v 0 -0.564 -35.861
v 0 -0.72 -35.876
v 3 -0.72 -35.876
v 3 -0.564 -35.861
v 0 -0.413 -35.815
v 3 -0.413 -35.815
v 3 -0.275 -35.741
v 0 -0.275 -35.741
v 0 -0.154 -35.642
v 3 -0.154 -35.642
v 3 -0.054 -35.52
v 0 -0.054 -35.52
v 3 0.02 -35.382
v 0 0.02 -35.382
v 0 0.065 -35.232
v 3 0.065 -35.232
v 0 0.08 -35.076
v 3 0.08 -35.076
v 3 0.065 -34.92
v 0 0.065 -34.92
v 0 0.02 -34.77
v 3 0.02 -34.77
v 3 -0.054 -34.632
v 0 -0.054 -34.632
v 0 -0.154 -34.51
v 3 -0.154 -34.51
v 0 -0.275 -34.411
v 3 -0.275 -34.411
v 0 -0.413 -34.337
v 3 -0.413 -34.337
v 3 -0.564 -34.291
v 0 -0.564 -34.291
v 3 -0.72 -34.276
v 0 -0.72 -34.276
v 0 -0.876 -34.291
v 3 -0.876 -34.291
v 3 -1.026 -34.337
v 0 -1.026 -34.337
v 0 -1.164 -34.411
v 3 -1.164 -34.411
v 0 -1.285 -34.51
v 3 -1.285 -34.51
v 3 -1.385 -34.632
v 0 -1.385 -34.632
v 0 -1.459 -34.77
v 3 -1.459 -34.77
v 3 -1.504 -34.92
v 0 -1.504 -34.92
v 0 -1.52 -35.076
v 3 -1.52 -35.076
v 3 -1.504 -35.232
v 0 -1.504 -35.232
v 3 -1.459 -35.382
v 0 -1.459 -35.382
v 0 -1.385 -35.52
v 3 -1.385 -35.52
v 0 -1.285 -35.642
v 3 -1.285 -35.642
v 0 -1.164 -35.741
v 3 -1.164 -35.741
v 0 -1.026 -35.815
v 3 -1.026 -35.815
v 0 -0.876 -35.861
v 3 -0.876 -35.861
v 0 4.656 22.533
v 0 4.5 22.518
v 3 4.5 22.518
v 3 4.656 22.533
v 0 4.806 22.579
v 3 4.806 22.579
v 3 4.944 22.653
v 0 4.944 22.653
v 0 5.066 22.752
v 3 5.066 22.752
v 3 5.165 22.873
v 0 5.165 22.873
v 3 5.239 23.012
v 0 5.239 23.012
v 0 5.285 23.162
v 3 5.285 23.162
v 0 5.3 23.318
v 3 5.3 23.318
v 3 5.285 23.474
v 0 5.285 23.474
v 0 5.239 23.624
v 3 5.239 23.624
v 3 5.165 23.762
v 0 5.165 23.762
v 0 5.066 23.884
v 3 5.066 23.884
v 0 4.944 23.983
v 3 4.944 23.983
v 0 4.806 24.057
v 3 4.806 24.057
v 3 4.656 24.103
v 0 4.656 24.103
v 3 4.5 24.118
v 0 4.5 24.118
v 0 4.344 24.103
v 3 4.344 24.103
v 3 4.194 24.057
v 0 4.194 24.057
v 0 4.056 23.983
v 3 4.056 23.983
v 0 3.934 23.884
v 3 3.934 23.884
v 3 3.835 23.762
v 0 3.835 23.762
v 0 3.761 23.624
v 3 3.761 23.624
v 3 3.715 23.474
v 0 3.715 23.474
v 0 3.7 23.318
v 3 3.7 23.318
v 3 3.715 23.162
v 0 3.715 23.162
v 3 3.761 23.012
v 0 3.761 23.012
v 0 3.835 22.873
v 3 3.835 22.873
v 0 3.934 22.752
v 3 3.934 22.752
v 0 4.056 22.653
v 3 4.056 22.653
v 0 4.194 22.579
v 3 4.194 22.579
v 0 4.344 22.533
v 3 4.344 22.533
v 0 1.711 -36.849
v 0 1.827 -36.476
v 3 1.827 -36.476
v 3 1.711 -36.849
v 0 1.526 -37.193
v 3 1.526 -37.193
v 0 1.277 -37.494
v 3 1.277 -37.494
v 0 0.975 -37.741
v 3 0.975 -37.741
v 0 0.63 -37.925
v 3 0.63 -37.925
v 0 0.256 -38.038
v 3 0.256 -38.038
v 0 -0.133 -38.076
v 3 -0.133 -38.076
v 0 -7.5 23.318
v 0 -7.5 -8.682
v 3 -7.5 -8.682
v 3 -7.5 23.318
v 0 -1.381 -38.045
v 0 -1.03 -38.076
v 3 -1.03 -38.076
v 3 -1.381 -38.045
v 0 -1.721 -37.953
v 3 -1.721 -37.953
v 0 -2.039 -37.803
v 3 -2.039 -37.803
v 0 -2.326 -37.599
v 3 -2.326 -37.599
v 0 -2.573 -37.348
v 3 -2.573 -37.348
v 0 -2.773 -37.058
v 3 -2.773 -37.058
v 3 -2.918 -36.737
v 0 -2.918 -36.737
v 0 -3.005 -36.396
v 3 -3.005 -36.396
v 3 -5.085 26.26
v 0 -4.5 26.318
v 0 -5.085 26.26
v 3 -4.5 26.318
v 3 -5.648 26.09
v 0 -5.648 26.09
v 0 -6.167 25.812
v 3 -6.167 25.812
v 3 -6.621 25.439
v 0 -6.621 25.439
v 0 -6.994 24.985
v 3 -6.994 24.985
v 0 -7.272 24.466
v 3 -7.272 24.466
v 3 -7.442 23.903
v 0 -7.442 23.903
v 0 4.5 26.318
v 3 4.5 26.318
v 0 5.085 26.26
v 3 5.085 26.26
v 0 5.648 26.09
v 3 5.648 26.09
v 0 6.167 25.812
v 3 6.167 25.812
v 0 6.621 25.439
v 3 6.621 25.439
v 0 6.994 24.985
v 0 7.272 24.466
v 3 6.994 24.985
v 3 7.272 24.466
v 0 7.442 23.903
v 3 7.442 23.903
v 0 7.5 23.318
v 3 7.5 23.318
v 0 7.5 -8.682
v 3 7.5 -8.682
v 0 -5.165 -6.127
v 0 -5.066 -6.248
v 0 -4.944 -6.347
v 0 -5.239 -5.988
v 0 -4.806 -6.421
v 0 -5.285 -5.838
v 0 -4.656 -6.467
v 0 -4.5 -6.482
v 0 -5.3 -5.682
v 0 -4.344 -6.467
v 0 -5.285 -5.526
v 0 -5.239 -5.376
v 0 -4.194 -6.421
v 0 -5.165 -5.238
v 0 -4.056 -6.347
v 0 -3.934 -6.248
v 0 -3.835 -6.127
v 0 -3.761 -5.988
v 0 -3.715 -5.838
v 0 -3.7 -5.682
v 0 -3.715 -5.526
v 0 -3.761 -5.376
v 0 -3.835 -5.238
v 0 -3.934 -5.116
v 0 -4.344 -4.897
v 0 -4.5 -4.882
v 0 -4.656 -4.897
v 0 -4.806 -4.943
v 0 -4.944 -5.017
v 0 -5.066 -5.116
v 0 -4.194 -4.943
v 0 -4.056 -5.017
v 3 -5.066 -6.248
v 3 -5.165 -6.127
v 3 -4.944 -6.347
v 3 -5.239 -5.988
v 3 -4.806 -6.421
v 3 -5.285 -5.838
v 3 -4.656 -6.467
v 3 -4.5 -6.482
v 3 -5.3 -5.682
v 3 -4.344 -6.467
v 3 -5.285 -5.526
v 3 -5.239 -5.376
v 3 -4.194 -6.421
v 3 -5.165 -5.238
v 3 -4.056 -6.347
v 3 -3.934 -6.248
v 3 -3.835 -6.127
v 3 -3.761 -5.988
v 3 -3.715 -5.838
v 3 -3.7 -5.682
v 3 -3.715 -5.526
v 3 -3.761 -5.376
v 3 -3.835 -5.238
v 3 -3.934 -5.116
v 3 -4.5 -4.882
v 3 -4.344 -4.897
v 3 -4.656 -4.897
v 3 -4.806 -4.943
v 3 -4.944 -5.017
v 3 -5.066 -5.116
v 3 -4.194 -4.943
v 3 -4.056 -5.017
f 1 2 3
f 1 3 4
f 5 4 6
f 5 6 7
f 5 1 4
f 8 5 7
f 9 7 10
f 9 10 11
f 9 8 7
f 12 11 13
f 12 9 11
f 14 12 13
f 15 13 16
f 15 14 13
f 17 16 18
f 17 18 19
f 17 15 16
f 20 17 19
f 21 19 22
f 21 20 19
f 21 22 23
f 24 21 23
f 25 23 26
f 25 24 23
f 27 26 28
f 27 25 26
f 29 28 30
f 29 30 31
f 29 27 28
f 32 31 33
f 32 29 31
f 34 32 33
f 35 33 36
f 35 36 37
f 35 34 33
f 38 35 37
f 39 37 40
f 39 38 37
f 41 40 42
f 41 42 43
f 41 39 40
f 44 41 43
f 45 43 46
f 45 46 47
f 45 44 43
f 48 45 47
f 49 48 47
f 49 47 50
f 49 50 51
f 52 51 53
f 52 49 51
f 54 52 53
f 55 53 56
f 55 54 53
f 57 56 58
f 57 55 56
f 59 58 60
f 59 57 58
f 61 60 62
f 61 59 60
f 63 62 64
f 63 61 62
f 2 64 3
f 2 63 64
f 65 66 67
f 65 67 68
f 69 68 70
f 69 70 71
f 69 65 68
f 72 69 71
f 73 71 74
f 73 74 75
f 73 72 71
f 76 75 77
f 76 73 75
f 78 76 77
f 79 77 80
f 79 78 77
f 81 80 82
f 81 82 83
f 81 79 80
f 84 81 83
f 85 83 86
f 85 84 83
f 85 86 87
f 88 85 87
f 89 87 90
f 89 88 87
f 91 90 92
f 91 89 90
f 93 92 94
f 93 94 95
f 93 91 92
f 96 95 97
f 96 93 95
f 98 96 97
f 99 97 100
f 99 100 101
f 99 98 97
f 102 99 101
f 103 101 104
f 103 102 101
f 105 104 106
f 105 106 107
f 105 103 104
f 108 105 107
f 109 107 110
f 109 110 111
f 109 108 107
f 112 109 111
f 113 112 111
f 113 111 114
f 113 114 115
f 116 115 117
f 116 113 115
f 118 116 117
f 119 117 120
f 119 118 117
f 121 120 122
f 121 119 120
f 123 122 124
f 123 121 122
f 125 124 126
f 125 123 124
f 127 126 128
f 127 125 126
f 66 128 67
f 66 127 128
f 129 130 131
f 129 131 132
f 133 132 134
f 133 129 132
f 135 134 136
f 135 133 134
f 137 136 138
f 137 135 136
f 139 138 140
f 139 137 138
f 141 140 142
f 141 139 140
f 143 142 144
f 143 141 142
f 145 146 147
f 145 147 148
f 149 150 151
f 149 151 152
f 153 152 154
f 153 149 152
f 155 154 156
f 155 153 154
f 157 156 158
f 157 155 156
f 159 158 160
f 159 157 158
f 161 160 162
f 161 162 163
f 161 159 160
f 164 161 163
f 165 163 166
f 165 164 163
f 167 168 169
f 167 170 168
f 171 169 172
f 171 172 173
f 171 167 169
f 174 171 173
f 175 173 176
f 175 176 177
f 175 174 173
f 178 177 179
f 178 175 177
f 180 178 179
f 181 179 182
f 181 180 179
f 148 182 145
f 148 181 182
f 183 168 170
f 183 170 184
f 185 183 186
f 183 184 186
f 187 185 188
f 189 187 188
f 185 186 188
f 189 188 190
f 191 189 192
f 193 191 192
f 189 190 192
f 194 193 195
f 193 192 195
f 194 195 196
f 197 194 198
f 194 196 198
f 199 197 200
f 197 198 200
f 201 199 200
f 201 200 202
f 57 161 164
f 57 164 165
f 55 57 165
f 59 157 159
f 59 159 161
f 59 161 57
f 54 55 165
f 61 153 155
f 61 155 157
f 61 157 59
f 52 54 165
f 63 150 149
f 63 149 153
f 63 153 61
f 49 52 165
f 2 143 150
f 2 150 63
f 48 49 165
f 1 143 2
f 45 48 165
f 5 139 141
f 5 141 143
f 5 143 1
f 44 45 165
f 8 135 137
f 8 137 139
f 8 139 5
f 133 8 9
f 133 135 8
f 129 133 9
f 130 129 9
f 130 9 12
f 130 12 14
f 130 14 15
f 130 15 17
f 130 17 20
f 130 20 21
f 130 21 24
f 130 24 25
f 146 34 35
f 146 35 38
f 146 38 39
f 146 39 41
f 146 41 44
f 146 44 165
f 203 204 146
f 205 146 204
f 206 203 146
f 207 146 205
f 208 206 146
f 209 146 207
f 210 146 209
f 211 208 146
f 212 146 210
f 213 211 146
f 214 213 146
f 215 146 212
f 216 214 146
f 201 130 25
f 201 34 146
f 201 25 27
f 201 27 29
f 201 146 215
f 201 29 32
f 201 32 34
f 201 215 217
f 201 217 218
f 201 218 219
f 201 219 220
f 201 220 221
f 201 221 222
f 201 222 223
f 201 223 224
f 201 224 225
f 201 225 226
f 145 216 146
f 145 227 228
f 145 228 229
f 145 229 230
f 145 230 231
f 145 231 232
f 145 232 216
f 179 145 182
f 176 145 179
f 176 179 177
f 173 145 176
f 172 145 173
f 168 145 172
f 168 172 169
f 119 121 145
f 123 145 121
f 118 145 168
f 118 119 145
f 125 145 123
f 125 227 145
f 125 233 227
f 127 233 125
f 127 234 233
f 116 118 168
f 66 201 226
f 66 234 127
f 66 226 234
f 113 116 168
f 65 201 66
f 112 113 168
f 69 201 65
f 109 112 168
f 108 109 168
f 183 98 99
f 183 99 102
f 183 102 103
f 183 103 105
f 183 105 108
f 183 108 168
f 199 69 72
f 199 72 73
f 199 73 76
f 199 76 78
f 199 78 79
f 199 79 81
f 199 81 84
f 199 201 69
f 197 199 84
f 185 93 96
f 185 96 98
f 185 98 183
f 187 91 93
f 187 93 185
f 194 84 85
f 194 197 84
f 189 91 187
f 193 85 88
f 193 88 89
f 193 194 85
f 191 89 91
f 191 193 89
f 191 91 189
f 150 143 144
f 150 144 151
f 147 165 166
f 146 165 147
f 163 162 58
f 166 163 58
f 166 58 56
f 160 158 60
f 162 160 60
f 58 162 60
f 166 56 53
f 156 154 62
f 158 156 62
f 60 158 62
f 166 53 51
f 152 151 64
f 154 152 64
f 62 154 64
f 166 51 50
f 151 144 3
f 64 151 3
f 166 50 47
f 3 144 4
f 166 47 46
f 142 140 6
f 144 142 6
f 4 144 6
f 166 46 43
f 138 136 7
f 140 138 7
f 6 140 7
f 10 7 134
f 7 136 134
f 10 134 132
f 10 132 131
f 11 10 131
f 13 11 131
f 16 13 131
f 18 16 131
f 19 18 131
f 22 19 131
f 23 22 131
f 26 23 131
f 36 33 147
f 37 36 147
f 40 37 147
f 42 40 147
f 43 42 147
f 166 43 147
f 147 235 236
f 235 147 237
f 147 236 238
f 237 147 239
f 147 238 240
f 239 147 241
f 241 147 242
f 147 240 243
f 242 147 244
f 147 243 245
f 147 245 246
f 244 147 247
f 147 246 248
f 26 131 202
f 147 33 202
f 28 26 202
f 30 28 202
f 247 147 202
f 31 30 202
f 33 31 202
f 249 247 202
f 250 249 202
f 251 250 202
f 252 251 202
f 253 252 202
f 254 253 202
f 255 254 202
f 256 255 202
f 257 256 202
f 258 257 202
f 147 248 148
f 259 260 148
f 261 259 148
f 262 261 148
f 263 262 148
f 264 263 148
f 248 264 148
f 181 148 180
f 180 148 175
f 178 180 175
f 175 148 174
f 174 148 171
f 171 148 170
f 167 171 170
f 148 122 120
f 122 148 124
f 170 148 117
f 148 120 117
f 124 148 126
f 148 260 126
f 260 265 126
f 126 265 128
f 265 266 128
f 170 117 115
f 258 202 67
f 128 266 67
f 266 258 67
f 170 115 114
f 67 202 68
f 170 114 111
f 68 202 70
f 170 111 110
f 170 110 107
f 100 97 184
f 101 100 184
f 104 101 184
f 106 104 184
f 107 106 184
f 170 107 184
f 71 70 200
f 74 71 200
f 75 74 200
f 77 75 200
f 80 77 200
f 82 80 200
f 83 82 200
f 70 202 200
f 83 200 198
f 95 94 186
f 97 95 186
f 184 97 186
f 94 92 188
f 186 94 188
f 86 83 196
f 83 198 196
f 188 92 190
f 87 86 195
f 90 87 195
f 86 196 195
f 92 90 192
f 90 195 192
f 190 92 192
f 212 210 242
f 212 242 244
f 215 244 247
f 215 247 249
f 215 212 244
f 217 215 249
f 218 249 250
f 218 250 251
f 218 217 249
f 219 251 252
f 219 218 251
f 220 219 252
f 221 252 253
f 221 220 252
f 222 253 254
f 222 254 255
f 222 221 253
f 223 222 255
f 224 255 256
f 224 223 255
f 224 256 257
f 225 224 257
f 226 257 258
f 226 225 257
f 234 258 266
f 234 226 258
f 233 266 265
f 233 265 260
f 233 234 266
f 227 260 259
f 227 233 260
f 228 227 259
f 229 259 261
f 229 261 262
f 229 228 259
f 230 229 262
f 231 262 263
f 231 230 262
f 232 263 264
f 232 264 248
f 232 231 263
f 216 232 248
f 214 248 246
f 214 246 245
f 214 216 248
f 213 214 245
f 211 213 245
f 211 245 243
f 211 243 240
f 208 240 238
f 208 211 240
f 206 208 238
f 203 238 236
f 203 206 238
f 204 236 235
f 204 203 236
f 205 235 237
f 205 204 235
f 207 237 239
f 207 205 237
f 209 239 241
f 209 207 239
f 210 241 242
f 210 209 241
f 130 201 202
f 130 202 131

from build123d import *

# Parameters (mm, degrees)
ESBO_O1_R                = 0.8
RESSALTO_EXTRUS_O1_DEPTH = 3
FILETE1_R                = 3
FILETE2_R                = 3


with BuildPart() as part:
    # Esboço1 → Ressalto-extrusão1 (new body)
    with BuildSketch(Plane(origin=(0, 0, 0), x_dir=(0, 0, -1), z_dir=(1, 0, 0))):
        with BuildLine():
            Line((-26.317877539, 0), (-26.317877539, 7.5))
            Line((-26.317877539, 7.5), (8.682122461, 7.5))
            Line((8.682122461, 7.5), (36.475999374, 1.826598632))
            ThreePointArc((36.475999374, 1.826598632), (37.625192713, 1.131917902), (38.075999374, -0.132993162))
            Line((38.075999374, -0.132993162), (38.075999374, -1.030306154))
            ThreePointArc((38.075999374, -1.030306154), (37.599230732, -2.326364112), (36.396233145, -3.004502277))
            Line((36.396233145, -3.004502277), (8.682122461, -7.5))
            Line((8.682122461, -7.5), (-26.317877539, -7.5))
            Line((-26.317877539, -7.5), (-26.317877539, 0))
        make_face()
        with Locations((-23.317877539, 4.5)):
            Circle(ESBO_O1_R, mode=Mode.SUBTRACT)
        with Locations((5.682122461, -4.5)):
            Circle(ESBO_O1_R, mode=Mode.SUBTRACT)
        with Locations((35.075999374, -0.719592125)):
            Circle(ESBO_O1_R, mode=Mode.SUBTRACT)
    extrude(amount=RESSALTO_EXTRUS_O1_DEPTH)

    # Filete1
    filete1_edges = [part.edges().sort_by_distance(p)[0] for p in [
        (1.5, -7.5, 26.317877539),
    ]]
    fillet(filete1_edges, radius=FILETE1_R)

    # Filete2
    filete2_edges = [part.edges().sort_by_distance(p)[0] for p in [
        (1.5, 7.5, 26.317877539),
    ]]
    fillet(filete2_edges, radius=FILETE2_R)


solid = part.part
